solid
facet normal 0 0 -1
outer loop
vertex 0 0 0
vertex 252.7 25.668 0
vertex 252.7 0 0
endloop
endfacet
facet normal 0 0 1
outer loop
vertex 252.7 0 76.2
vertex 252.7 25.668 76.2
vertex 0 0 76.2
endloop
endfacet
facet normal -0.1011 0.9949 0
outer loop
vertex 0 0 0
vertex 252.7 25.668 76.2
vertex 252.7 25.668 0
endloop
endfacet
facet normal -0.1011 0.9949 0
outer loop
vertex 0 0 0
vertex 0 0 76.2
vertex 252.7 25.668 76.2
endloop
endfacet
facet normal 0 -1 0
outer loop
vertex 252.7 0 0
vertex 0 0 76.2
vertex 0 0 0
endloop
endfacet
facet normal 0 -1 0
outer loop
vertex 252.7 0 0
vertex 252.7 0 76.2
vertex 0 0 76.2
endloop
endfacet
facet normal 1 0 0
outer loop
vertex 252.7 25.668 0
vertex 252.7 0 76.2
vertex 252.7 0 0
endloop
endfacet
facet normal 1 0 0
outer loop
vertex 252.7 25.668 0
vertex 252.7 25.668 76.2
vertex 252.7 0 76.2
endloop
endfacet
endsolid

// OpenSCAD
// Paver Angle Shim for Wet Saw
// Creates 5.8 degree angle against fence for cutting circular wall wedges

// ============== PARAMETERS ==============

// Angle at the tip
shim_angle = 5.8;

// Height
shim_height = 3 * 25.4;  // 3 inches = 76.2 mm

// Hypotenuse length (the angled face that contacts paver)
hypotenuse = 10 * 25.4;  // 10 inches = 254 mm

// Calculate triangle dimensions from hypotenuse and angle
tri_length = hypotenuse * cos(shim_angle);  // Along fence
tri_width = hypotenuse * sin(shim_angle);   // Perpendicular to fence

// ============== MAIN SHAPE ==============

linear_extrude(height = shim_height) {
    polygon(points = [
        [0, 0],                  // Tip (against fence)
        [tri_length, 0],         // Back corner (against fence)
        [tri_length, tri_width]  // Front corner
    ]);
}

// ============== INFO ==============
echo("=== Fence Angle Shim ===");
echo(str("Angle: ", shim_angle, " degrees"));
echo(str("Hypotenuse: ", hypotenuse, " mm (", hypotenuse/25.4, " inches)"));
echo(str("Height: ", shim_height, " mm (", shim_height/25.4, " inches)"));
echo(str("Length along fence: ", tri_length, " mm (", tri_length/25.4, " inches)"));
echo(str("Width at thick end: ", tri_width, " mm (", tri_width/25.4, " inches)"));
